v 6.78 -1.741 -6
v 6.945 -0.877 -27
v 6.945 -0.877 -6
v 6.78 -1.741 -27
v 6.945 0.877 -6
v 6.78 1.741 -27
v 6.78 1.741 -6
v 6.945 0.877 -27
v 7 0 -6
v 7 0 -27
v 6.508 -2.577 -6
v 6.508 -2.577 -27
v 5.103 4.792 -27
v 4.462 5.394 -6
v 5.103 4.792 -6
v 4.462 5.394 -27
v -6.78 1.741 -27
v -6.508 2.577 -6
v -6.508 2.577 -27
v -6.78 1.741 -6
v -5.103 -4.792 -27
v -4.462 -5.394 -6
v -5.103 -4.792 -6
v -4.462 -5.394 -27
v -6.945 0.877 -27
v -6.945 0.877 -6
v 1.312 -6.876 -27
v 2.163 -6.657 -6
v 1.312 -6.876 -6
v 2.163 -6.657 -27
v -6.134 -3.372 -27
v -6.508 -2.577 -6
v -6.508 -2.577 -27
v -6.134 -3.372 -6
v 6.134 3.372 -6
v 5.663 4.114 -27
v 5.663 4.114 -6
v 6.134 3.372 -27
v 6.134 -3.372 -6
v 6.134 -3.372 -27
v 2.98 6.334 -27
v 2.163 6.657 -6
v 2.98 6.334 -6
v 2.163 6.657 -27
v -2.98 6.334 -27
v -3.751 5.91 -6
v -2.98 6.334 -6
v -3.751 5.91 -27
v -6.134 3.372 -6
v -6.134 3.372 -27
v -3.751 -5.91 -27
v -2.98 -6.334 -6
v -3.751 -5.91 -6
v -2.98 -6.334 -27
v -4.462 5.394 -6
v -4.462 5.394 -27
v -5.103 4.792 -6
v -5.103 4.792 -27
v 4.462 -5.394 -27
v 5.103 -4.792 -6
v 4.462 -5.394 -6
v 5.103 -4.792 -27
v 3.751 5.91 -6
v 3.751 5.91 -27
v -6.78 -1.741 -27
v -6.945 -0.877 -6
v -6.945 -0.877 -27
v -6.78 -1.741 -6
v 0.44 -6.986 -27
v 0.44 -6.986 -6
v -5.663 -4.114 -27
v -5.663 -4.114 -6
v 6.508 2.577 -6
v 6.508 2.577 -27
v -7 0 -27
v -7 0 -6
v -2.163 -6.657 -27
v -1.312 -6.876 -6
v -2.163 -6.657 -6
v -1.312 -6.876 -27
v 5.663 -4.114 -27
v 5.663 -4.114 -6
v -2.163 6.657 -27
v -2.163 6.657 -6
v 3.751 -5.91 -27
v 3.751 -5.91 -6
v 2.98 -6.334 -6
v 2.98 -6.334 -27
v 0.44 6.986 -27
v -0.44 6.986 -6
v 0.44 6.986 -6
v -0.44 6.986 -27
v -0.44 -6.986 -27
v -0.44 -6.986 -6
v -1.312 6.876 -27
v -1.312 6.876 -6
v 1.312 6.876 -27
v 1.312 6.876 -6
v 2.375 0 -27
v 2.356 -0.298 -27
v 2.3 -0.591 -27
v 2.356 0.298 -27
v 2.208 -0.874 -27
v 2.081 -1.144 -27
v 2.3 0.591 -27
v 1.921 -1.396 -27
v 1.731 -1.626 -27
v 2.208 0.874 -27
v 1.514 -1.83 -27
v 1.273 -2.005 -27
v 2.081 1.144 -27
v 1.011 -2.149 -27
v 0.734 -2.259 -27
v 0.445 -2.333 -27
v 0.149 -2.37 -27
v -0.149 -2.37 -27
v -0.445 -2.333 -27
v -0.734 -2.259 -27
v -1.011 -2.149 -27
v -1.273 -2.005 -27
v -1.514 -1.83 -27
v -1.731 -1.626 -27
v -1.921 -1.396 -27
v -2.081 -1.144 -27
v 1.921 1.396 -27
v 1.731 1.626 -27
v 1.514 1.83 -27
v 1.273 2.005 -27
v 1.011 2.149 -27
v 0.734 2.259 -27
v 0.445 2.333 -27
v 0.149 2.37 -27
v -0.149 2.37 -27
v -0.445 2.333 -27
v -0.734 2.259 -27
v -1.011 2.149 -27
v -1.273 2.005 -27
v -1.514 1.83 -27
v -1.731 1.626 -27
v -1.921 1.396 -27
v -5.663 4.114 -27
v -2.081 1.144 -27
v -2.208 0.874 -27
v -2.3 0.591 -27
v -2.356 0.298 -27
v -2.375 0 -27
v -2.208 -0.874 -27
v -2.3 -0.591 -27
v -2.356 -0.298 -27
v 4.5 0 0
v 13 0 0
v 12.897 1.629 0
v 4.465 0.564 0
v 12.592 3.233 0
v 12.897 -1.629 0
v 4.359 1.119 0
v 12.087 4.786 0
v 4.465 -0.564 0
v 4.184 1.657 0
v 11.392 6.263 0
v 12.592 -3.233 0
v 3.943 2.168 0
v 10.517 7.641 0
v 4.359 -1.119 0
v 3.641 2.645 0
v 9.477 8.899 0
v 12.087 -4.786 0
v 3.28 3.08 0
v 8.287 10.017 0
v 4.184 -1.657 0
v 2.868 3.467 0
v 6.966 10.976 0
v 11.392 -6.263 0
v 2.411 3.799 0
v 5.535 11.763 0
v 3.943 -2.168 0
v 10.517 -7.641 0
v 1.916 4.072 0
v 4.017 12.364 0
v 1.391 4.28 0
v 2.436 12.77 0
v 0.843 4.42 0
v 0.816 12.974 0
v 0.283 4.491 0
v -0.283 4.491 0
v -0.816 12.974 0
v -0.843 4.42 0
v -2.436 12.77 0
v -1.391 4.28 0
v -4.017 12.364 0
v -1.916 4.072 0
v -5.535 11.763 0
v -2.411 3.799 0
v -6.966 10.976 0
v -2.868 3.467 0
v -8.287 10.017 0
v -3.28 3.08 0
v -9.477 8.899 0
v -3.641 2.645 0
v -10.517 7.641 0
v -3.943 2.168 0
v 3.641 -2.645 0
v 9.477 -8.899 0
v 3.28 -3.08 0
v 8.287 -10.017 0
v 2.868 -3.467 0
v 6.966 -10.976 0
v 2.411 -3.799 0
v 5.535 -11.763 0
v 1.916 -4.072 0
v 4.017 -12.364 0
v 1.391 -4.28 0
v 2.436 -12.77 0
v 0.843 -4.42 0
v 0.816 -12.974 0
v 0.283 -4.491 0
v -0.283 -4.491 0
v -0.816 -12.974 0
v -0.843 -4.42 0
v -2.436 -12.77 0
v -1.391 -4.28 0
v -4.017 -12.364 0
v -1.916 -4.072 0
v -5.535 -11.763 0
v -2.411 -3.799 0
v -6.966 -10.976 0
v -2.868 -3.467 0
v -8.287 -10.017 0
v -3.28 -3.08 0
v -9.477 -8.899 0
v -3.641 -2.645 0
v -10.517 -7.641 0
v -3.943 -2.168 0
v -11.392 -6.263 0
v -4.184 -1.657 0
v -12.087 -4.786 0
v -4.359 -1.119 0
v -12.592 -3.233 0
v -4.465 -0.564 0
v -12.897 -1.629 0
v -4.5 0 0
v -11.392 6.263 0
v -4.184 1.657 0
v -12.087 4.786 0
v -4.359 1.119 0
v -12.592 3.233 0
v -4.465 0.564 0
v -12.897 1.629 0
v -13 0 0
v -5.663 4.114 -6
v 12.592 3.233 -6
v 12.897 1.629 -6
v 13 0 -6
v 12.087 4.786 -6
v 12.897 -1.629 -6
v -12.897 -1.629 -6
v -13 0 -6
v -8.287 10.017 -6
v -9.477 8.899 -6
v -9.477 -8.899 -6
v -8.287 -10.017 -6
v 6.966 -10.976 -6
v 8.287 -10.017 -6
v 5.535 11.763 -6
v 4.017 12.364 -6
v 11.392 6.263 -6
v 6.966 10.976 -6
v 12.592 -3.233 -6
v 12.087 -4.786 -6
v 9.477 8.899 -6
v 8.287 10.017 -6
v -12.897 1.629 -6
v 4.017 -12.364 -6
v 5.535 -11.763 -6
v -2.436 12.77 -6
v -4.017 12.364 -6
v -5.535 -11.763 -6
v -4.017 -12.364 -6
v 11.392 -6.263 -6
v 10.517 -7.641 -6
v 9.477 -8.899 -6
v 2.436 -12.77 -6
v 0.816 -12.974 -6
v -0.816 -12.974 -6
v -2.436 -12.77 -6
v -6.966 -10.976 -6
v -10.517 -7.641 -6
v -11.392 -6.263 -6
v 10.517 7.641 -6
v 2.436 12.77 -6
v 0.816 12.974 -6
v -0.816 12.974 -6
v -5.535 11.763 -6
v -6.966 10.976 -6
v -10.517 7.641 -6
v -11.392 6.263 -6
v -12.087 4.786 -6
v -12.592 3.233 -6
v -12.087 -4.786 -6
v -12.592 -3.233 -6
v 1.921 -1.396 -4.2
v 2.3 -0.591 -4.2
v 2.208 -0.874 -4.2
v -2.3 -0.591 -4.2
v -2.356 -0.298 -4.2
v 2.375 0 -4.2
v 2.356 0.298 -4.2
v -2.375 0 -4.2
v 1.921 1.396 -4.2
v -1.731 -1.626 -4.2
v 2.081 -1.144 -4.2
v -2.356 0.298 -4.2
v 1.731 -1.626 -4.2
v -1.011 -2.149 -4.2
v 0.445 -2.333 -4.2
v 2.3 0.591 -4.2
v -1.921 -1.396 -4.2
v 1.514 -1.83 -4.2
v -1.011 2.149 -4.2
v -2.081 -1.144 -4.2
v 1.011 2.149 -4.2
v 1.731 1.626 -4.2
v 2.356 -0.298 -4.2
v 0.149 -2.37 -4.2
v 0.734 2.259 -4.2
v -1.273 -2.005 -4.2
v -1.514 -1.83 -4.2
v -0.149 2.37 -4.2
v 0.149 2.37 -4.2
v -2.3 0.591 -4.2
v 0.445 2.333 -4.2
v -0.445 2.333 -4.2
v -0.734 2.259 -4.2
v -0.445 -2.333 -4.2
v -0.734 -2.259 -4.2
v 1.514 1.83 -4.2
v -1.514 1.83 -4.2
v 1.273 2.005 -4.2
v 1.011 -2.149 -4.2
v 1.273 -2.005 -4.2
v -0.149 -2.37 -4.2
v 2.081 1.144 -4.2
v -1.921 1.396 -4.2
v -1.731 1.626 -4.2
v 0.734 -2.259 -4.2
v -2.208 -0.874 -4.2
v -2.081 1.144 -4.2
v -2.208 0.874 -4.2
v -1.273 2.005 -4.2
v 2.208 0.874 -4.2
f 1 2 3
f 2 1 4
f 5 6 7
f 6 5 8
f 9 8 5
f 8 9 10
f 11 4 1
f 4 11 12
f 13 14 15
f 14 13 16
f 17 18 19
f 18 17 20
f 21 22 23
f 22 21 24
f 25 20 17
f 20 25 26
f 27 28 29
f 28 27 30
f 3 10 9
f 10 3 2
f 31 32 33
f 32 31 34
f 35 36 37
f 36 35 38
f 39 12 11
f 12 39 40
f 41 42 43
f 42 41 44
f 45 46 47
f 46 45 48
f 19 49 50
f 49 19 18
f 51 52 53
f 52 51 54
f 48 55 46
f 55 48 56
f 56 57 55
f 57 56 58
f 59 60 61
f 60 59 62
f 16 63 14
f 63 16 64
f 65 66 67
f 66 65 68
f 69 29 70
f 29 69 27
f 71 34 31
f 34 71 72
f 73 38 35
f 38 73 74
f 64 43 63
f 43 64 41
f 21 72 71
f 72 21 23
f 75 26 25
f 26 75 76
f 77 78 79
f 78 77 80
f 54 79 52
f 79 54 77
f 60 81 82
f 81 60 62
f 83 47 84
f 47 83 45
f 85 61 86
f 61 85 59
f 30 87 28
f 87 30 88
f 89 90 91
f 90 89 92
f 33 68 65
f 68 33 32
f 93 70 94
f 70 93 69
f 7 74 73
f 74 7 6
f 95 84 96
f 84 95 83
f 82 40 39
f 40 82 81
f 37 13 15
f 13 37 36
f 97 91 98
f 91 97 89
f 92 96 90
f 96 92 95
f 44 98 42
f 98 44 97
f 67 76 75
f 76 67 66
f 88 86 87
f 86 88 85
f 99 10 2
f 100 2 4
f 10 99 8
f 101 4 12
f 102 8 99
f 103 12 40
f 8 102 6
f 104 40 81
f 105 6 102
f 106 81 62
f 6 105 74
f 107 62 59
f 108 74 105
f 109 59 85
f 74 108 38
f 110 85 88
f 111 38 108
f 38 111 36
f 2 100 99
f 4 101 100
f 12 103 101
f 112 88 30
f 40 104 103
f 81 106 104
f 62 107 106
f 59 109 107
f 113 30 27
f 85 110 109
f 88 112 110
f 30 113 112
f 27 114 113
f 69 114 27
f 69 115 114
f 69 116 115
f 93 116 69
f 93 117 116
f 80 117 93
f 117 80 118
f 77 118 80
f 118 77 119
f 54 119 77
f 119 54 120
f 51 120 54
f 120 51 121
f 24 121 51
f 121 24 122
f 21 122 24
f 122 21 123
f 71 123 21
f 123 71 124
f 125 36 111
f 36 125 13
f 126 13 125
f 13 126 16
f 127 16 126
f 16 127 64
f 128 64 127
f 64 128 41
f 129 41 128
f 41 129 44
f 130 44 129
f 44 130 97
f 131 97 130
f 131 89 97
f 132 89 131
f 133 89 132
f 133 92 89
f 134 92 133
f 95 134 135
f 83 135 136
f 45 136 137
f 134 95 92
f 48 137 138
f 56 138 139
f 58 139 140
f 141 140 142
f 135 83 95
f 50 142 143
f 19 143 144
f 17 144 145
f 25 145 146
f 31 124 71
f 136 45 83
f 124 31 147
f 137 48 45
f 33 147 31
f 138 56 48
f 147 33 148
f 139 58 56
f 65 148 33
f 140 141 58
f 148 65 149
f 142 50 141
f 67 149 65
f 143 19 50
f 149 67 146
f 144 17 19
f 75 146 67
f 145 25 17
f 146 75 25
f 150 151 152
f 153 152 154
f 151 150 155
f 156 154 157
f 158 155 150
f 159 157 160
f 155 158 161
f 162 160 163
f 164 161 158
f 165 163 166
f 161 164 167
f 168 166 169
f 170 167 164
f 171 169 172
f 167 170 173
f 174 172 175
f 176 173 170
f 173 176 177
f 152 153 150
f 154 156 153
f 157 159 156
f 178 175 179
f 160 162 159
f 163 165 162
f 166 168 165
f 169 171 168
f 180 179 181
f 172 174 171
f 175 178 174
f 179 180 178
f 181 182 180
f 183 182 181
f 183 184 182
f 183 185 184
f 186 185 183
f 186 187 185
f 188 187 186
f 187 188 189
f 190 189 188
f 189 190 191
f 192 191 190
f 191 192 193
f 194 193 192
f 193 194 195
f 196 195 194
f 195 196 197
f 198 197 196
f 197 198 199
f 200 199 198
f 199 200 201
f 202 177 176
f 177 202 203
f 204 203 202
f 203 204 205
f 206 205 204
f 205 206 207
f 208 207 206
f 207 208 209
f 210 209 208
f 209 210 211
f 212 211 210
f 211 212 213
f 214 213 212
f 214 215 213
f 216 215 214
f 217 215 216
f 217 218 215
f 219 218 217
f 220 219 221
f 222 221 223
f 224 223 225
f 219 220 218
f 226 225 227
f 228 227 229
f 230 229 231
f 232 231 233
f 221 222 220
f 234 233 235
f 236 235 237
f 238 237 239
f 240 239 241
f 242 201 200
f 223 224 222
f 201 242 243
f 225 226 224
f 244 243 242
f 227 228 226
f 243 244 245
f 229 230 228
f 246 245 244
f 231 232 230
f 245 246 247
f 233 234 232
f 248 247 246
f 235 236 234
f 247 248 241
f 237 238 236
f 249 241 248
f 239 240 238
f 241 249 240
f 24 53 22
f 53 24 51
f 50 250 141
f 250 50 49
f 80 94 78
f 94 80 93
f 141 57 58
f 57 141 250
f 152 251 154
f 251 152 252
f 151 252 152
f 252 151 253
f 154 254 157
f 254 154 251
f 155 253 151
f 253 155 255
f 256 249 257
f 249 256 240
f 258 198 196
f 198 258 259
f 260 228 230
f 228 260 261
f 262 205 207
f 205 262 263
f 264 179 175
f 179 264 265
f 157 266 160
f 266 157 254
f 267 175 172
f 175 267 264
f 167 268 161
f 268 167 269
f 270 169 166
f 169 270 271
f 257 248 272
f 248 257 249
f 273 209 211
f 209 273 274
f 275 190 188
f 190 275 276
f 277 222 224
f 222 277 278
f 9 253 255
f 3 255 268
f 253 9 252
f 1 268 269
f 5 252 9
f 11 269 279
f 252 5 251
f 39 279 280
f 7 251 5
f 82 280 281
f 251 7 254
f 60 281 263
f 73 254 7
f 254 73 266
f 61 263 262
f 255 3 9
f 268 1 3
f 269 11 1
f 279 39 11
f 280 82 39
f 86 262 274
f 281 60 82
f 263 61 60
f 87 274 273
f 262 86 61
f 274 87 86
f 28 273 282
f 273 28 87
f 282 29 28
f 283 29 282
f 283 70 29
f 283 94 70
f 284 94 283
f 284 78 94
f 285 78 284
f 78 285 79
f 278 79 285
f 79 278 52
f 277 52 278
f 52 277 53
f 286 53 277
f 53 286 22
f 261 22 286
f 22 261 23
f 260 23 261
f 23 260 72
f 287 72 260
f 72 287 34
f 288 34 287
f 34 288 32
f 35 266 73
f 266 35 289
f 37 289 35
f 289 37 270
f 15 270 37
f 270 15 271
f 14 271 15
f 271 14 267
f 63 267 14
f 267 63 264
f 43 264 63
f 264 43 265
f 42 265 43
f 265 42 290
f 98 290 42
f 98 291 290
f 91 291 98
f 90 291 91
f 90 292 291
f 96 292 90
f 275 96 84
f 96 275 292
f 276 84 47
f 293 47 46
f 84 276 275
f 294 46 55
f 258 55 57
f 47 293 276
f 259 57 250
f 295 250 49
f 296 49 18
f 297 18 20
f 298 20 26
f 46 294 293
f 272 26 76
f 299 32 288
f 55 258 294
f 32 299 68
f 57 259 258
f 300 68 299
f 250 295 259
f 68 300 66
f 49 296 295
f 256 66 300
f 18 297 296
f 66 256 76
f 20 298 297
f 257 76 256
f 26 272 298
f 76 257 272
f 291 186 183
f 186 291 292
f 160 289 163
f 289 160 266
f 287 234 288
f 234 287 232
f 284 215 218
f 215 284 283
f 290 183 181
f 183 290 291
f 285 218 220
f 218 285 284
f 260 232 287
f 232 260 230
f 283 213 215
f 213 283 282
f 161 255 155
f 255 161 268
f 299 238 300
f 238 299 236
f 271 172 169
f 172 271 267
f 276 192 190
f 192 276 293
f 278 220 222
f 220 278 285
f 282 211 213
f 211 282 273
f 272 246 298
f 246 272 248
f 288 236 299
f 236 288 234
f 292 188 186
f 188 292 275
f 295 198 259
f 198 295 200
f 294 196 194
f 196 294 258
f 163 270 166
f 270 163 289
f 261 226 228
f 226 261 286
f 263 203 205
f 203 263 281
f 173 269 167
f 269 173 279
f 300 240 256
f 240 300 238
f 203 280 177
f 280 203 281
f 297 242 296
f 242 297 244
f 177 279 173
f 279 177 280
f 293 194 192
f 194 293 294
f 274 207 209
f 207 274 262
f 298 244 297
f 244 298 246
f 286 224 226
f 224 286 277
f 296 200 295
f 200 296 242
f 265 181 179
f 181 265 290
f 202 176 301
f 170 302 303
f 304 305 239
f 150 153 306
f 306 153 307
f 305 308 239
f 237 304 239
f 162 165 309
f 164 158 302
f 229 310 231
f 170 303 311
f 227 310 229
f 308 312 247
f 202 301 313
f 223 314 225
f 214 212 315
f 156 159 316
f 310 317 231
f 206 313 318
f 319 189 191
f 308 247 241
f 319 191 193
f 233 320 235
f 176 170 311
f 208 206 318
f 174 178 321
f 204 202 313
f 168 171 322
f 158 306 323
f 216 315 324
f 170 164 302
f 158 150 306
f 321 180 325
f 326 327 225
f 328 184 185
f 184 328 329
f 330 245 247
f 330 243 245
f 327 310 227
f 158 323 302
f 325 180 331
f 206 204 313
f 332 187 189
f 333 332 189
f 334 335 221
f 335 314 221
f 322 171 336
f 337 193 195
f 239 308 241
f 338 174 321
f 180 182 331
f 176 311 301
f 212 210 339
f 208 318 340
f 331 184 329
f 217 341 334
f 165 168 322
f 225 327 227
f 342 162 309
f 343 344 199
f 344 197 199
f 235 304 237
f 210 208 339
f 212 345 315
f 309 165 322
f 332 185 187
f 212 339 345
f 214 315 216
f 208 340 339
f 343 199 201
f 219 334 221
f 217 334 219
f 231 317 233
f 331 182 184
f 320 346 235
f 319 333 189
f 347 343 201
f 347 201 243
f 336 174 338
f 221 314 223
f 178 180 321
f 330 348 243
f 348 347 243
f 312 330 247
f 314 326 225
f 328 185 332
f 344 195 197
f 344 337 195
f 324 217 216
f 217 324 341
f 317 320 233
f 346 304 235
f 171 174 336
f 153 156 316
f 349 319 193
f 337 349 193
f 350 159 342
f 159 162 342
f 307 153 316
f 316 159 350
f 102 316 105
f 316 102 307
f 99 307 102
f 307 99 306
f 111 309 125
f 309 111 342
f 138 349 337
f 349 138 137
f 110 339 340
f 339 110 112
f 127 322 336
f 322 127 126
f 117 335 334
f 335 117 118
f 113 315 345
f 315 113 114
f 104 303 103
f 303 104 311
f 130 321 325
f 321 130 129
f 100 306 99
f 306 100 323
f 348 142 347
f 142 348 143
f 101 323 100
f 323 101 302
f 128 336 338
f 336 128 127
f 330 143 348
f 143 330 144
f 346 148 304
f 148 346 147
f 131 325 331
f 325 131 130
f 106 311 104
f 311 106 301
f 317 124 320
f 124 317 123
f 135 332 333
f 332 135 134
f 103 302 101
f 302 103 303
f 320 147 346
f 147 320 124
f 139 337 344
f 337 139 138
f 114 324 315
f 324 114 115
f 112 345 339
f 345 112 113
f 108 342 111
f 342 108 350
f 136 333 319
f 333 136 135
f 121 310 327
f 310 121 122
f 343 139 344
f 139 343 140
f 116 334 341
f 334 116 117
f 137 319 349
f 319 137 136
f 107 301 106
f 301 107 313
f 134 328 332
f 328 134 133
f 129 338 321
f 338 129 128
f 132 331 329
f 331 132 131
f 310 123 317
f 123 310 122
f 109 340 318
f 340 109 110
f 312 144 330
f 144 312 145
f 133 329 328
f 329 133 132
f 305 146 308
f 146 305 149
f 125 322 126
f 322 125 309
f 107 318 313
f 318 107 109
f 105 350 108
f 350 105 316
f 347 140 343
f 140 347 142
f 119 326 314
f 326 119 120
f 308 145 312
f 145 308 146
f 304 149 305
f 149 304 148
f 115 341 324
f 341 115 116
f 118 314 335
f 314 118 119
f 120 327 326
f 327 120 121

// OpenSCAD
$fn = 50;


difference() {
	union() {
		translate(v = [0, 0, -27.0000000000]) {
			cylinder(h = 27, r = 7.0000000000);
		}
		translate(v = [0, 0, -6.0000000000]) {
			cylinder(h = 6, r = 13.0000000000);
		}
	}
	union() {
		translate(v = [0, 0, 0]) {
			rotate(a = [0, 0, 0]) {
				difference() {
					union() {
						#translate(v = [0, 0, -27.0000000000]) {
							cylinder(h = 27, r = 2.2500000000);
						}
						#translate(v = [0, 0, -4.2000000000]) {
							cylinder(h = 4.2000000000, r1 = 2.3750000000, r2 = 4.5000000000);
						}
						#translate(v = [0, 0, -27.0000000000]) {
							cylinder(h = 27, r = 2.3750000000);
						}
						#translate(v = [0, 0, -27.0000000000]) {
							cylinder(h = 27, r = 2.2500000000);
						}
					}
					union();
				}
			}
		}
	}
}
